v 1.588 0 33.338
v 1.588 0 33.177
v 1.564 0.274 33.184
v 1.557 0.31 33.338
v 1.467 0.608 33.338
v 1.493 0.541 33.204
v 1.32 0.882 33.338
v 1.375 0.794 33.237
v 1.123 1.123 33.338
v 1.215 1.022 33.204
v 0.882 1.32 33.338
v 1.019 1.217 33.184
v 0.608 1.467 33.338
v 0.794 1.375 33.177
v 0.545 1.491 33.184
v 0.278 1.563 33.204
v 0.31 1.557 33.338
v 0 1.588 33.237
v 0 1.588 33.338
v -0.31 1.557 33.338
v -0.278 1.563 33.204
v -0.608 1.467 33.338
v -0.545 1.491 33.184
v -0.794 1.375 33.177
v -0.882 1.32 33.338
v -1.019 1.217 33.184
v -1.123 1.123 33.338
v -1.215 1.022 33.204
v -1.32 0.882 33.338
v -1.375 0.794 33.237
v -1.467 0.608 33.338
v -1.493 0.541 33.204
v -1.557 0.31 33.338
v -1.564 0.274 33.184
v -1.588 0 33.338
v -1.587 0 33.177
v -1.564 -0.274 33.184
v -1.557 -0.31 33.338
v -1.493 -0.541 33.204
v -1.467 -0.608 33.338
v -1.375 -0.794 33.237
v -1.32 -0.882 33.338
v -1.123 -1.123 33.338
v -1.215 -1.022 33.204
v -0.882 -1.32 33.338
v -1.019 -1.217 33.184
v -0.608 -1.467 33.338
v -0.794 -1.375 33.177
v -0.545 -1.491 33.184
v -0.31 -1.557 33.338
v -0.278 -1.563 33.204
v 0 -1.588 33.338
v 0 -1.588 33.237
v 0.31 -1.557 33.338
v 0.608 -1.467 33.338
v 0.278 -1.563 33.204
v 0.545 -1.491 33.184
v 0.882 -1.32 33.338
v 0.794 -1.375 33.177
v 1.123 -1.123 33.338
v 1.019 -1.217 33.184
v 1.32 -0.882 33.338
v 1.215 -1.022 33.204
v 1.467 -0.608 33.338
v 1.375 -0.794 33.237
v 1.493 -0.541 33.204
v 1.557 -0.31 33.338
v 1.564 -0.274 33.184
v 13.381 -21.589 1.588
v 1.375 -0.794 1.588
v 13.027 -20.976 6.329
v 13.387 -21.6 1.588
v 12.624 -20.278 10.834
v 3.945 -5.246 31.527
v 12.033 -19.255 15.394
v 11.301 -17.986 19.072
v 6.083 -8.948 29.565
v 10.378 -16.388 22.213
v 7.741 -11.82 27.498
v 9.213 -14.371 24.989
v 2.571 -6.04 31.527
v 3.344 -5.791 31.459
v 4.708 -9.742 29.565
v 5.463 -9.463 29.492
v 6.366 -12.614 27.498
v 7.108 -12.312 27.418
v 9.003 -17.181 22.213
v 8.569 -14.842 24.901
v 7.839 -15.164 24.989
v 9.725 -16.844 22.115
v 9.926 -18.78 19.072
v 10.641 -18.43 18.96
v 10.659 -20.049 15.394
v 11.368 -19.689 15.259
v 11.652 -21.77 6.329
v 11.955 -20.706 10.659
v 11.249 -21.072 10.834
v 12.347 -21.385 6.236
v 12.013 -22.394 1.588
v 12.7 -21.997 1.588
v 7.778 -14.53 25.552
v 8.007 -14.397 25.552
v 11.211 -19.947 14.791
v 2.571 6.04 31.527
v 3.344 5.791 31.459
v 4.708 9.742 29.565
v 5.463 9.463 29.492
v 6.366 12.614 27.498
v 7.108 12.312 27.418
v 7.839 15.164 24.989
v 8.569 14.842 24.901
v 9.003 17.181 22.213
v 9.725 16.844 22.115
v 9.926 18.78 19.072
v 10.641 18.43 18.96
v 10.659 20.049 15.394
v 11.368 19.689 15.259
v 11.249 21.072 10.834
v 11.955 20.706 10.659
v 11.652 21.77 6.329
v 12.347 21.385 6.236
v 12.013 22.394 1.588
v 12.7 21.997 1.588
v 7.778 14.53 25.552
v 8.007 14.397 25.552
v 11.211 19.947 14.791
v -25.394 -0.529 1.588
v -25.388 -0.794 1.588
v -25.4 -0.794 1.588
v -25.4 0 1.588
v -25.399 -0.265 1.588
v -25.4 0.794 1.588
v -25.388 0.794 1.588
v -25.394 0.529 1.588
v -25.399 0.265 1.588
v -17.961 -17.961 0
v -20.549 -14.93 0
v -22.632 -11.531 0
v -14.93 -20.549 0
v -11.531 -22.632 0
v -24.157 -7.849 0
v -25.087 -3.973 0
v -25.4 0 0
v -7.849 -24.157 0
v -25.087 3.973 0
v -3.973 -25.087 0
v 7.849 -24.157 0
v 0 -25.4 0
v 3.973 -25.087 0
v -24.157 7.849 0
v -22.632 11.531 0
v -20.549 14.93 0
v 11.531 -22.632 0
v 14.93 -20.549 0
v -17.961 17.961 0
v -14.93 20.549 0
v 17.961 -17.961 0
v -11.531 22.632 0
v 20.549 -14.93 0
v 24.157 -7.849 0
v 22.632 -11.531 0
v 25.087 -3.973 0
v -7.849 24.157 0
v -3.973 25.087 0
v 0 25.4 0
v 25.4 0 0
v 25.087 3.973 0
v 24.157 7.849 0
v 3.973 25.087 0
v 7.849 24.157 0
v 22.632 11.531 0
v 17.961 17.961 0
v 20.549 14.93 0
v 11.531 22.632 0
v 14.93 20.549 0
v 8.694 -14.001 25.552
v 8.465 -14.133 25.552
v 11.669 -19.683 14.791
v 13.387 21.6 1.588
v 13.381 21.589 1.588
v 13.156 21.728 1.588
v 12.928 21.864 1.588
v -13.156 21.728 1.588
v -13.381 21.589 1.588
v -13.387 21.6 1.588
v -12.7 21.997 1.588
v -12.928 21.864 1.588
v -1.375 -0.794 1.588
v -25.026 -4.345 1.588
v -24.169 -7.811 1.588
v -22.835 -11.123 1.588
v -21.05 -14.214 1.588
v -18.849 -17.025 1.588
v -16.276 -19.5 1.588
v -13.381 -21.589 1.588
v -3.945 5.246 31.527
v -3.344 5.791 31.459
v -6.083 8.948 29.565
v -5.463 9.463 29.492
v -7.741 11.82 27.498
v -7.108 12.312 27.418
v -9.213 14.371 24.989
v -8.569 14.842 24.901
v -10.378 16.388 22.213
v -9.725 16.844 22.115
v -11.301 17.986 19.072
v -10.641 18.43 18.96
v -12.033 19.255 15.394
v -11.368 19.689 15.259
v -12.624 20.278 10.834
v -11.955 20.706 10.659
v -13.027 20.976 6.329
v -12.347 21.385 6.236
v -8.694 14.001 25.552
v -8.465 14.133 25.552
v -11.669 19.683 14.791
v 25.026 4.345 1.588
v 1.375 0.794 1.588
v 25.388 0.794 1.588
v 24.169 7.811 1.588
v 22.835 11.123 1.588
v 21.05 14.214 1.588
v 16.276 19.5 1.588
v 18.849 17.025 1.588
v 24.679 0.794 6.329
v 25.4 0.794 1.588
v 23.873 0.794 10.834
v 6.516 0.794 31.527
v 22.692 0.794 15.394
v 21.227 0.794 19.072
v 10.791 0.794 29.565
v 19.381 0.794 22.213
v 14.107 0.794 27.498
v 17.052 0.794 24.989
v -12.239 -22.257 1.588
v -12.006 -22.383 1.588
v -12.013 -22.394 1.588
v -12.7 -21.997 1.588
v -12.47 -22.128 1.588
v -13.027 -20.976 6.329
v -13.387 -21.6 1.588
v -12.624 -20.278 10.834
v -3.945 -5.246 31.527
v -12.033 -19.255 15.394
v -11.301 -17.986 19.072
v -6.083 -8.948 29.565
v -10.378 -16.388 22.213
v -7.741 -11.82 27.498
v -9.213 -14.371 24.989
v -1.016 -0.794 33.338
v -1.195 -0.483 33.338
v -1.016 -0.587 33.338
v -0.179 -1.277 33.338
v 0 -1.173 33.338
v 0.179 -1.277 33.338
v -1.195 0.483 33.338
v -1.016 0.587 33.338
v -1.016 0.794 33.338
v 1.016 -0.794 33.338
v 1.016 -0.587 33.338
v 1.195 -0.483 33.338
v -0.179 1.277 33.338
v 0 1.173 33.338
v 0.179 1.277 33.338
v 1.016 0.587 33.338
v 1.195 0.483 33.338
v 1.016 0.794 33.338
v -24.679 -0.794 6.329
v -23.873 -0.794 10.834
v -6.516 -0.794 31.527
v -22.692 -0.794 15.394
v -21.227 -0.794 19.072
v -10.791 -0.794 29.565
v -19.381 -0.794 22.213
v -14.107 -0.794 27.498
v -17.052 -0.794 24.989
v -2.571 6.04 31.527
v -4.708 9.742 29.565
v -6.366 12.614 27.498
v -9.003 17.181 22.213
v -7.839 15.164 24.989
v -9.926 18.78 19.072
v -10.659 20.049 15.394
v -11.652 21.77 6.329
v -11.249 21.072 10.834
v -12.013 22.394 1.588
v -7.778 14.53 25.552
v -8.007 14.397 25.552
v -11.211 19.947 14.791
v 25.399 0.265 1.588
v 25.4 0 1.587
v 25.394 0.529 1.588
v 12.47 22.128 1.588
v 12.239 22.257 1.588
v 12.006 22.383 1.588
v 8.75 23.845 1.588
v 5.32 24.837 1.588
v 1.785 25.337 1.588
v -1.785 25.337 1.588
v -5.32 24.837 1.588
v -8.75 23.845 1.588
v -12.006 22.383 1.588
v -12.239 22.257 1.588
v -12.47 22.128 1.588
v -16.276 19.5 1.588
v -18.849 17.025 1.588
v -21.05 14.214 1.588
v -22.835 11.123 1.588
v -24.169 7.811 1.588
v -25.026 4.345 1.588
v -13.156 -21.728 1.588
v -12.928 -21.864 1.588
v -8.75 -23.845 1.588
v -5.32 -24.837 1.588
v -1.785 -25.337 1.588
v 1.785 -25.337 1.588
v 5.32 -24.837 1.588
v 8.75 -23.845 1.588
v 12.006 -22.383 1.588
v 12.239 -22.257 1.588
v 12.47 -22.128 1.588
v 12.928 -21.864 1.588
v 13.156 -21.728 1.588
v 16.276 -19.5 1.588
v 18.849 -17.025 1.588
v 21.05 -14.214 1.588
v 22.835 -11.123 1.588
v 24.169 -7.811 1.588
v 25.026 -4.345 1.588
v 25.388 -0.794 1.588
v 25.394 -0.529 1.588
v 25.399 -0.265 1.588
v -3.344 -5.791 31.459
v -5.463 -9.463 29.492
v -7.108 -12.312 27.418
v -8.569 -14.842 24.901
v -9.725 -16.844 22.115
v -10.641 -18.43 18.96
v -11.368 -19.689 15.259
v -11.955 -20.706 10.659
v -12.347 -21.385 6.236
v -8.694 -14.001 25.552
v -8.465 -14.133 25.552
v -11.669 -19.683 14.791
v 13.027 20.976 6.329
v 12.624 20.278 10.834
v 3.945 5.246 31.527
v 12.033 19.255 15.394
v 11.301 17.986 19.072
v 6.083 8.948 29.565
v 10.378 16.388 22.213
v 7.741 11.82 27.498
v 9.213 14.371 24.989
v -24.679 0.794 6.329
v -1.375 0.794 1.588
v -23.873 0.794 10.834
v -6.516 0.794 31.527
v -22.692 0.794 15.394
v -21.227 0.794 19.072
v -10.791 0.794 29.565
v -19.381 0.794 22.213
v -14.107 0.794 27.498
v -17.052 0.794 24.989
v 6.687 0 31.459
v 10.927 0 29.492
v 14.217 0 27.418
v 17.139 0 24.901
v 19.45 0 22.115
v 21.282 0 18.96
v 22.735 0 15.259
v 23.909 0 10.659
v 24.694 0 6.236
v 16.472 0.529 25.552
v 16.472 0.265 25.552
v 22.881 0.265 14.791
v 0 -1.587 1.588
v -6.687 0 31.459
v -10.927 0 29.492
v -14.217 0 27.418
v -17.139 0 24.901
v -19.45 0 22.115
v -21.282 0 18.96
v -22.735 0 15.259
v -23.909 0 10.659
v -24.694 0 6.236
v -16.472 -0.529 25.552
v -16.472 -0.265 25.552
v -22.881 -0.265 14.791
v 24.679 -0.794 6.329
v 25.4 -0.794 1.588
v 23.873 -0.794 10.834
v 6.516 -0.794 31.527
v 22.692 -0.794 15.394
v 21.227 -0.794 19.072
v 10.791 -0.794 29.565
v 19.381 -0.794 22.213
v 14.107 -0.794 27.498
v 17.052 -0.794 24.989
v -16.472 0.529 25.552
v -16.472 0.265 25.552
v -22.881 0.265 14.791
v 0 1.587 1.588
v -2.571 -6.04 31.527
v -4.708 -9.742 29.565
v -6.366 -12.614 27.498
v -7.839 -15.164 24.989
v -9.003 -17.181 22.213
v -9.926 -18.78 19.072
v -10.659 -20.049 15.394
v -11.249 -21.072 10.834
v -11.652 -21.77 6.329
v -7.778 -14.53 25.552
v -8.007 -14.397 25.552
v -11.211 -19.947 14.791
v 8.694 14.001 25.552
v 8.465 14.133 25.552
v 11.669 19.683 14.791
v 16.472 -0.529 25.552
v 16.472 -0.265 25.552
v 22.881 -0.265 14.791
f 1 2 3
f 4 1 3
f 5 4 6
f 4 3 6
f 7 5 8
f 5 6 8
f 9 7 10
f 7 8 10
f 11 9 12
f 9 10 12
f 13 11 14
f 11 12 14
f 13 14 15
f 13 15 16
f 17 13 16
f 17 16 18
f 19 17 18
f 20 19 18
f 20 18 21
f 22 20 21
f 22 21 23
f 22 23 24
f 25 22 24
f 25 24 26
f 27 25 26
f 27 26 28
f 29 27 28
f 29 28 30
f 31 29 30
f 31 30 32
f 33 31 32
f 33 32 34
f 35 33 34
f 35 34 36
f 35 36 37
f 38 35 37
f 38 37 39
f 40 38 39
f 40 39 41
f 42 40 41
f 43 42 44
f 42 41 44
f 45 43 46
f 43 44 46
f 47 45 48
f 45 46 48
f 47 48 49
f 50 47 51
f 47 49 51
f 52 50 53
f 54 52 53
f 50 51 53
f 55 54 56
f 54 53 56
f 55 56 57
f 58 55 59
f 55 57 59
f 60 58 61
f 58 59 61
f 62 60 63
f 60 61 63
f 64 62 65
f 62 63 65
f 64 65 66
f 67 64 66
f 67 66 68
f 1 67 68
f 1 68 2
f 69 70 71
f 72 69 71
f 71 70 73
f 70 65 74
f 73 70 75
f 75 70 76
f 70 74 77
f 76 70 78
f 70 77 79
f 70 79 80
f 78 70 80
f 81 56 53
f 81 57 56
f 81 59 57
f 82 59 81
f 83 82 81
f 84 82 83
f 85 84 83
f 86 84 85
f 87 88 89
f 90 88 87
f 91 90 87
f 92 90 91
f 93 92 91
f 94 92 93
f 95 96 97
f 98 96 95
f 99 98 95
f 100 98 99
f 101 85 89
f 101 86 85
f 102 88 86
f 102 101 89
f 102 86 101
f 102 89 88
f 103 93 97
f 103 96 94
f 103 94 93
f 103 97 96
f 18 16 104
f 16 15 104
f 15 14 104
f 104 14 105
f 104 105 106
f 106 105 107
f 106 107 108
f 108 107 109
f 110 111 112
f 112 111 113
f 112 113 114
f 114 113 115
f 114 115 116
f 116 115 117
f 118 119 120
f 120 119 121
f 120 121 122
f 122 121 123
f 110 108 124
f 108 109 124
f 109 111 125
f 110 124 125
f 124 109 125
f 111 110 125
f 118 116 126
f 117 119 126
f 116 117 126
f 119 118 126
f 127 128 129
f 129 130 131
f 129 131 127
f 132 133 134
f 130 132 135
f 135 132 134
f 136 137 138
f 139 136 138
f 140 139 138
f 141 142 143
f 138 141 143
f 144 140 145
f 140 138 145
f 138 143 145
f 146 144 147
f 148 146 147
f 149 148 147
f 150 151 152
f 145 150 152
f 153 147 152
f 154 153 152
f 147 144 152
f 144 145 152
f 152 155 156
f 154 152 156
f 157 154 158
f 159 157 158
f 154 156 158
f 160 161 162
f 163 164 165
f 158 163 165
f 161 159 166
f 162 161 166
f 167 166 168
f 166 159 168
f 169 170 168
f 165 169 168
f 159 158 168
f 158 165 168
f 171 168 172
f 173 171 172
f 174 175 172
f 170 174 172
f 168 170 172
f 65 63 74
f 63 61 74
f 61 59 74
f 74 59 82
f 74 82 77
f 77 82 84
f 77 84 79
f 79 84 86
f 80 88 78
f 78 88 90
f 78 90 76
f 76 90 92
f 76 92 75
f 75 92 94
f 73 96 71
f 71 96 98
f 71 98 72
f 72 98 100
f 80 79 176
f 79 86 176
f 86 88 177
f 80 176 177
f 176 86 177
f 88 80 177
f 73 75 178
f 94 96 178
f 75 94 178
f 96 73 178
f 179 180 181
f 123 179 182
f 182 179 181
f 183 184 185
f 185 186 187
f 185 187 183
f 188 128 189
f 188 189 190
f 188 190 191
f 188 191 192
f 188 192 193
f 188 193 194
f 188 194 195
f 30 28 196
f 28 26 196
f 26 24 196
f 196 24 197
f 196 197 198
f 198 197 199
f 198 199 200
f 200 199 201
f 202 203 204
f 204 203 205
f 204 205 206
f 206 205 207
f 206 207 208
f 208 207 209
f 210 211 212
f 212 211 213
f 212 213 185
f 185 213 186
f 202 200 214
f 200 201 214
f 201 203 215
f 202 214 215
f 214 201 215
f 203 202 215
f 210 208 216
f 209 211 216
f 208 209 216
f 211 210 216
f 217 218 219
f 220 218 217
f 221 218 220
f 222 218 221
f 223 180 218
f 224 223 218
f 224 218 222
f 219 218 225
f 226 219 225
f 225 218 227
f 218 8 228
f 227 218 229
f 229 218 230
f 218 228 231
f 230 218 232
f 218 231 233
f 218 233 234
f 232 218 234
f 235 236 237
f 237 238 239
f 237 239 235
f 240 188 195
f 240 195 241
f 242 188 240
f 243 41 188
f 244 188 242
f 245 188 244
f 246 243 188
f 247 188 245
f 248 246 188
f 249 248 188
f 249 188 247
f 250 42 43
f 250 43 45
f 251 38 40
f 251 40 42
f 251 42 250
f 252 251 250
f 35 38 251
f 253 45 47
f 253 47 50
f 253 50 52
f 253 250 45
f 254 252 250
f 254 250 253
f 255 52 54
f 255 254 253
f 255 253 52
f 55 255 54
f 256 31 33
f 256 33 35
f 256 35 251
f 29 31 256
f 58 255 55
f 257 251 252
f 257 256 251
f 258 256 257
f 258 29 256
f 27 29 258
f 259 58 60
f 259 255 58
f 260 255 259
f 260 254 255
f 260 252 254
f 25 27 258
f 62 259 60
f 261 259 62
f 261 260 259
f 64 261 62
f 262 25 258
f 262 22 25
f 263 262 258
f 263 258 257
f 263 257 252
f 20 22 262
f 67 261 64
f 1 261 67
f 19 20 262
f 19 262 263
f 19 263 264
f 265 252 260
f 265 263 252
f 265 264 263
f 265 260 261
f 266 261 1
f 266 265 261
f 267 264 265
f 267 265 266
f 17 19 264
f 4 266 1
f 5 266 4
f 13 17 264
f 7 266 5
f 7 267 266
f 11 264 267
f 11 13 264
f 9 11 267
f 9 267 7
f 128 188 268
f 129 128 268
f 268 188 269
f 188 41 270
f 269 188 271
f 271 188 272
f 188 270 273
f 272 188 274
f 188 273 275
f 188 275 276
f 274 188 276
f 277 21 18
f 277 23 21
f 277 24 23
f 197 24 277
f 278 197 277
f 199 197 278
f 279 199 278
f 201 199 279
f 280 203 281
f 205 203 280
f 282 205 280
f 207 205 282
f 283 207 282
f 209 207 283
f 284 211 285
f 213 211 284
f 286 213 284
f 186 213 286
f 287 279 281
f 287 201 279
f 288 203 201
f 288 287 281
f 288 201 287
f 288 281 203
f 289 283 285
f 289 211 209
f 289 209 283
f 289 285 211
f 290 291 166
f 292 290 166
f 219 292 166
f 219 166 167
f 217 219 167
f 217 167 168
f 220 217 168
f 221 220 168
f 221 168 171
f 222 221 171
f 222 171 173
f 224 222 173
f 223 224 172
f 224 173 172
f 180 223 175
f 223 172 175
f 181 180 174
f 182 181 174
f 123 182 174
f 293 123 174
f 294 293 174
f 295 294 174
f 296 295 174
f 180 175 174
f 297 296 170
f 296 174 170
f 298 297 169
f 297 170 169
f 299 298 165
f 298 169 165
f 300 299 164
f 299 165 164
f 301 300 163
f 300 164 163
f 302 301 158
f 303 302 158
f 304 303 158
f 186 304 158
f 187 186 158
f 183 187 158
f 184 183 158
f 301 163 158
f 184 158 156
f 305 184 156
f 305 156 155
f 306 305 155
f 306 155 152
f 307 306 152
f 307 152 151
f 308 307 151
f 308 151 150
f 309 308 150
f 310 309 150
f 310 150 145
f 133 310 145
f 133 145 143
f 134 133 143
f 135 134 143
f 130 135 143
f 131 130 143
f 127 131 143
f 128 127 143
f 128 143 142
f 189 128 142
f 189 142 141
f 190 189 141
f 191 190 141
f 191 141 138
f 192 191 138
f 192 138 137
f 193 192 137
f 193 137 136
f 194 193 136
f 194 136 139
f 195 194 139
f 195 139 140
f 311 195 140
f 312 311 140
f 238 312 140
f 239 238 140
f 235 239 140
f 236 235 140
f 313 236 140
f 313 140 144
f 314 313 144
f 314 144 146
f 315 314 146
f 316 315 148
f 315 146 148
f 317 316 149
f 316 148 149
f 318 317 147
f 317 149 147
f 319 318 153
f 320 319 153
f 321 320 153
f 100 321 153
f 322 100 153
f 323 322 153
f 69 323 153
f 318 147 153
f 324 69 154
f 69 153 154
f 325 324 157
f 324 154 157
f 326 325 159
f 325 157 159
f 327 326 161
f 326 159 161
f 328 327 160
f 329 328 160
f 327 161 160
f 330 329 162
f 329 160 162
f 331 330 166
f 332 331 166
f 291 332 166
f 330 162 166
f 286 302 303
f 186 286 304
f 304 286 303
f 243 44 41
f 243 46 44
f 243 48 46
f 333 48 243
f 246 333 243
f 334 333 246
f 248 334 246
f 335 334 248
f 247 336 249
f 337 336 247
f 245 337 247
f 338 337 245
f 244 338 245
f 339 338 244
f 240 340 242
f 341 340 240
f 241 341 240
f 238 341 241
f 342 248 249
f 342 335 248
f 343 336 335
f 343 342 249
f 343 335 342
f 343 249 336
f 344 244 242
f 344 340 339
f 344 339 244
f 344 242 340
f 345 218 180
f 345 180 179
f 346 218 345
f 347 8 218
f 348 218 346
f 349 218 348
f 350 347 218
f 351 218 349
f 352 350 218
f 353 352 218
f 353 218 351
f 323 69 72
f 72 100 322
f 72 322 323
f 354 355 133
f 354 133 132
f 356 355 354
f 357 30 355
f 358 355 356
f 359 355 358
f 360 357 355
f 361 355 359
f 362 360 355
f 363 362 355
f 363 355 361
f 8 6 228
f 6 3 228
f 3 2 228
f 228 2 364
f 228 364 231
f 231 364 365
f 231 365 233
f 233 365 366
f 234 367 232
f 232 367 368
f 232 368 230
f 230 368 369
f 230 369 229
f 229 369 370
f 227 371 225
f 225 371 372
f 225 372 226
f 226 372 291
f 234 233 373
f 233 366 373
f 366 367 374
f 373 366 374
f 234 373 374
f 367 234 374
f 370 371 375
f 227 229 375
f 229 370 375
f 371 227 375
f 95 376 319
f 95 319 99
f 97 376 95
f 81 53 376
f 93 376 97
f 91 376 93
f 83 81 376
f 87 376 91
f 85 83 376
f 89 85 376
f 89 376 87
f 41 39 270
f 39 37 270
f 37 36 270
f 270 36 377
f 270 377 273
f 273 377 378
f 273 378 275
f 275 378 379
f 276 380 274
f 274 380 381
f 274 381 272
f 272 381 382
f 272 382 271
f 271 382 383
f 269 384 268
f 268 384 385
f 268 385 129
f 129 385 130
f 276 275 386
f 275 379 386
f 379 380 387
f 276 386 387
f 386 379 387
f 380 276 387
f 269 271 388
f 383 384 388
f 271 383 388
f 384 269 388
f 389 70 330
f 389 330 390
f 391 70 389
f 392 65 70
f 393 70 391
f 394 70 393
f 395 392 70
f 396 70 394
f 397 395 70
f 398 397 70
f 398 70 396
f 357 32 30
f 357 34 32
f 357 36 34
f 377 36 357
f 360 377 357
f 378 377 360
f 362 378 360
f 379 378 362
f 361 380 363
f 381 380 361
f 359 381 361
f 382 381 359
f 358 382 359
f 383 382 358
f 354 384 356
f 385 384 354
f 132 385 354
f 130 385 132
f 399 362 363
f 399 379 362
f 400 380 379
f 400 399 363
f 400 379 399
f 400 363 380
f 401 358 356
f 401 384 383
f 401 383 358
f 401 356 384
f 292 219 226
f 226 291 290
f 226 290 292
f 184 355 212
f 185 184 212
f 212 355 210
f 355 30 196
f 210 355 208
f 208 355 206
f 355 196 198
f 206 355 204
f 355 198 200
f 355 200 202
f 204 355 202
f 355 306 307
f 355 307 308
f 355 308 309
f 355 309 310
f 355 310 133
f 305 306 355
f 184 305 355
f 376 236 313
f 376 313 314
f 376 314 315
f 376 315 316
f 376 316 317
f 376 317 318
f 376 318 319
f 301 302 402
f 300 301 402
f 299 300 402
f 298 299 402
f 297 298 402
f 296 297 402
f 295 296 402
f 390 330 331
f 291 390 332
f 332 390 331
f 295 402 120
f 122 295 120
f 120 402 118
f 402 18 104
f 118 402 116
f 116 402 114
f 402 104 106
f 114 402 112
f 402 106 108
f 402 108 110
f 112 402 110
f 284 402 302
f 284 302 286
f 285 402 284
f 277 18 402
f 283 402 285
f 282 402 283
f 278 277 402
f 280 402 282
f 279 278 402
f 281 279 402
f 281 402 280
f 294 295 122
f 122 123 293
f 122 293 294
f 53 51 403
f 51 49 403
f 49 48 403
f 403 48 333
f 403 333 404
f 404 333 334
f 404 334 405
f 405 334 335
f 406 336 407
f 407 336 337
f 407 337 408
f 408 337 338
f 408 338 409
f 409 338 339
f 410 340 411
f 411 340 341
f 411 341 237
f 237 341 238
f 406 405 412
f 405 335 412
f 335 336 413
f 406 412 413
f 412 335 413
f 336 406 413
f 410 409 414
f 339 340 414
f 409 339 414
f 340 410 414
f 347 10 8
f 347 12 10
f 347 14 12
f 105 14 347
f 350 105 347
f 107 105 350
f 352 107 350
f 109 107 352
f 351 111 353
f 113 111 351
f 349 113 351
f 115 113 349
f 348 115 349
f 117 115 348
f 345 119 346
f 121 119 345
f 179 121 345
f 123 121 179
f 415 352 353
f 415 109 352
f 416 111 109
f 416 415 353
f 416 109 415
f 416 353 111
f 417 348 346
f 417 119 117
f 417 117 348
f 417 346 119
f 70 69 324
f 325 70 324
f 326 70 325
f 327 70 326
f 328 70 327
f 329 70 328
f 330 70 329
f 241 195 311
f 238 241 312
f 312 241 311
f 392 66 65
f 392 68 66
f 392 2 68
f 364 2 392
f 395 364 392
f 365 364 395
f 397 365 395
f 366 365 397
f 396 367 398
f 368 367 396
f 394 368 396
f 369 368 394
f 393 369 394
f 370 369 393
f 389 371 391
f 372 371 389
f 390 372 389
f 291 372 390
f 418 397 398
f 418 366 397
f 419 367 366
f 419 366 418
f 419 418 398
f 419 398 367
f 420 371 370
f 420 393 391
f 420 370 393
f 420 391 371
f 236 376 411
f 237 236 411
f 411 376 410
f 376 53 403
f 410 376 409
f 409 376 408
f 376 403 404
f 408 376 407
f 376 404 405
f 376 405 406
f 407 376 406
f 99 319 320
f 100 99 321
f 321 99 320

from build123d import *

# Parameters (mm, degrees)
F0_R            = 25.4
F1_DEPTH        = 1.5875
F2_R            = 1.5875
F3_DEPTH        = 31.75
F5_DEPTH        = 0.79375
F5_COPIES_COUNT = 6


# Not quite as in the source:
# - a pattern or mirror of a feature is missing from the dataset's text; its kind, count and spacing are read off the source's solid


with BuildPart() as f1:
    # F0 (on Top) → F1 (new body)
    with BuildSketch(Plane.XY):
        Circle(F0_R)
    extrude(amount=F1_DEPTH)

    # F2 (on face) → F3 (join)
    with BuildSketch(Plane.XY.offset(1.5875)):
        Circle(F2_R)
    extrude(amount=F3_DEPTH)

    # F4 (on Front) → F5 (join, symmetric)
    with BuildSketch(Plane.XZ):
        with BuildLine():
            Line((1.016, 33.3375), (1.016, 1.5875))
            Line((1.016, 1.5875), (25.4, 1.5875))
            add(Edge.make_bspline(
                [(1.016, 33.3375), (22.407008335, 27.4323299527), (23.2129693031, 15.8802140504), (25.4, 1.5875)],
                knots=[0, 0, 0, 0, 40.0330108286, 40.0330108286, 40.0330108286, 40.0330108286], degree=3))
        make_face()
    f5 = extrude(amount=F5_DEPTH, both=True)

    # F5_copies: F5 ×6 about axis
    f5_copies_axis = Axis((0, 0, 0), (0, 0, 1))
    for i in range(1, F5_COPIES_COUNT):
        add(f5.rotate(f5_copies_axis, i * 360 / F5_COPIES_COUNT))


solid = f1.part
